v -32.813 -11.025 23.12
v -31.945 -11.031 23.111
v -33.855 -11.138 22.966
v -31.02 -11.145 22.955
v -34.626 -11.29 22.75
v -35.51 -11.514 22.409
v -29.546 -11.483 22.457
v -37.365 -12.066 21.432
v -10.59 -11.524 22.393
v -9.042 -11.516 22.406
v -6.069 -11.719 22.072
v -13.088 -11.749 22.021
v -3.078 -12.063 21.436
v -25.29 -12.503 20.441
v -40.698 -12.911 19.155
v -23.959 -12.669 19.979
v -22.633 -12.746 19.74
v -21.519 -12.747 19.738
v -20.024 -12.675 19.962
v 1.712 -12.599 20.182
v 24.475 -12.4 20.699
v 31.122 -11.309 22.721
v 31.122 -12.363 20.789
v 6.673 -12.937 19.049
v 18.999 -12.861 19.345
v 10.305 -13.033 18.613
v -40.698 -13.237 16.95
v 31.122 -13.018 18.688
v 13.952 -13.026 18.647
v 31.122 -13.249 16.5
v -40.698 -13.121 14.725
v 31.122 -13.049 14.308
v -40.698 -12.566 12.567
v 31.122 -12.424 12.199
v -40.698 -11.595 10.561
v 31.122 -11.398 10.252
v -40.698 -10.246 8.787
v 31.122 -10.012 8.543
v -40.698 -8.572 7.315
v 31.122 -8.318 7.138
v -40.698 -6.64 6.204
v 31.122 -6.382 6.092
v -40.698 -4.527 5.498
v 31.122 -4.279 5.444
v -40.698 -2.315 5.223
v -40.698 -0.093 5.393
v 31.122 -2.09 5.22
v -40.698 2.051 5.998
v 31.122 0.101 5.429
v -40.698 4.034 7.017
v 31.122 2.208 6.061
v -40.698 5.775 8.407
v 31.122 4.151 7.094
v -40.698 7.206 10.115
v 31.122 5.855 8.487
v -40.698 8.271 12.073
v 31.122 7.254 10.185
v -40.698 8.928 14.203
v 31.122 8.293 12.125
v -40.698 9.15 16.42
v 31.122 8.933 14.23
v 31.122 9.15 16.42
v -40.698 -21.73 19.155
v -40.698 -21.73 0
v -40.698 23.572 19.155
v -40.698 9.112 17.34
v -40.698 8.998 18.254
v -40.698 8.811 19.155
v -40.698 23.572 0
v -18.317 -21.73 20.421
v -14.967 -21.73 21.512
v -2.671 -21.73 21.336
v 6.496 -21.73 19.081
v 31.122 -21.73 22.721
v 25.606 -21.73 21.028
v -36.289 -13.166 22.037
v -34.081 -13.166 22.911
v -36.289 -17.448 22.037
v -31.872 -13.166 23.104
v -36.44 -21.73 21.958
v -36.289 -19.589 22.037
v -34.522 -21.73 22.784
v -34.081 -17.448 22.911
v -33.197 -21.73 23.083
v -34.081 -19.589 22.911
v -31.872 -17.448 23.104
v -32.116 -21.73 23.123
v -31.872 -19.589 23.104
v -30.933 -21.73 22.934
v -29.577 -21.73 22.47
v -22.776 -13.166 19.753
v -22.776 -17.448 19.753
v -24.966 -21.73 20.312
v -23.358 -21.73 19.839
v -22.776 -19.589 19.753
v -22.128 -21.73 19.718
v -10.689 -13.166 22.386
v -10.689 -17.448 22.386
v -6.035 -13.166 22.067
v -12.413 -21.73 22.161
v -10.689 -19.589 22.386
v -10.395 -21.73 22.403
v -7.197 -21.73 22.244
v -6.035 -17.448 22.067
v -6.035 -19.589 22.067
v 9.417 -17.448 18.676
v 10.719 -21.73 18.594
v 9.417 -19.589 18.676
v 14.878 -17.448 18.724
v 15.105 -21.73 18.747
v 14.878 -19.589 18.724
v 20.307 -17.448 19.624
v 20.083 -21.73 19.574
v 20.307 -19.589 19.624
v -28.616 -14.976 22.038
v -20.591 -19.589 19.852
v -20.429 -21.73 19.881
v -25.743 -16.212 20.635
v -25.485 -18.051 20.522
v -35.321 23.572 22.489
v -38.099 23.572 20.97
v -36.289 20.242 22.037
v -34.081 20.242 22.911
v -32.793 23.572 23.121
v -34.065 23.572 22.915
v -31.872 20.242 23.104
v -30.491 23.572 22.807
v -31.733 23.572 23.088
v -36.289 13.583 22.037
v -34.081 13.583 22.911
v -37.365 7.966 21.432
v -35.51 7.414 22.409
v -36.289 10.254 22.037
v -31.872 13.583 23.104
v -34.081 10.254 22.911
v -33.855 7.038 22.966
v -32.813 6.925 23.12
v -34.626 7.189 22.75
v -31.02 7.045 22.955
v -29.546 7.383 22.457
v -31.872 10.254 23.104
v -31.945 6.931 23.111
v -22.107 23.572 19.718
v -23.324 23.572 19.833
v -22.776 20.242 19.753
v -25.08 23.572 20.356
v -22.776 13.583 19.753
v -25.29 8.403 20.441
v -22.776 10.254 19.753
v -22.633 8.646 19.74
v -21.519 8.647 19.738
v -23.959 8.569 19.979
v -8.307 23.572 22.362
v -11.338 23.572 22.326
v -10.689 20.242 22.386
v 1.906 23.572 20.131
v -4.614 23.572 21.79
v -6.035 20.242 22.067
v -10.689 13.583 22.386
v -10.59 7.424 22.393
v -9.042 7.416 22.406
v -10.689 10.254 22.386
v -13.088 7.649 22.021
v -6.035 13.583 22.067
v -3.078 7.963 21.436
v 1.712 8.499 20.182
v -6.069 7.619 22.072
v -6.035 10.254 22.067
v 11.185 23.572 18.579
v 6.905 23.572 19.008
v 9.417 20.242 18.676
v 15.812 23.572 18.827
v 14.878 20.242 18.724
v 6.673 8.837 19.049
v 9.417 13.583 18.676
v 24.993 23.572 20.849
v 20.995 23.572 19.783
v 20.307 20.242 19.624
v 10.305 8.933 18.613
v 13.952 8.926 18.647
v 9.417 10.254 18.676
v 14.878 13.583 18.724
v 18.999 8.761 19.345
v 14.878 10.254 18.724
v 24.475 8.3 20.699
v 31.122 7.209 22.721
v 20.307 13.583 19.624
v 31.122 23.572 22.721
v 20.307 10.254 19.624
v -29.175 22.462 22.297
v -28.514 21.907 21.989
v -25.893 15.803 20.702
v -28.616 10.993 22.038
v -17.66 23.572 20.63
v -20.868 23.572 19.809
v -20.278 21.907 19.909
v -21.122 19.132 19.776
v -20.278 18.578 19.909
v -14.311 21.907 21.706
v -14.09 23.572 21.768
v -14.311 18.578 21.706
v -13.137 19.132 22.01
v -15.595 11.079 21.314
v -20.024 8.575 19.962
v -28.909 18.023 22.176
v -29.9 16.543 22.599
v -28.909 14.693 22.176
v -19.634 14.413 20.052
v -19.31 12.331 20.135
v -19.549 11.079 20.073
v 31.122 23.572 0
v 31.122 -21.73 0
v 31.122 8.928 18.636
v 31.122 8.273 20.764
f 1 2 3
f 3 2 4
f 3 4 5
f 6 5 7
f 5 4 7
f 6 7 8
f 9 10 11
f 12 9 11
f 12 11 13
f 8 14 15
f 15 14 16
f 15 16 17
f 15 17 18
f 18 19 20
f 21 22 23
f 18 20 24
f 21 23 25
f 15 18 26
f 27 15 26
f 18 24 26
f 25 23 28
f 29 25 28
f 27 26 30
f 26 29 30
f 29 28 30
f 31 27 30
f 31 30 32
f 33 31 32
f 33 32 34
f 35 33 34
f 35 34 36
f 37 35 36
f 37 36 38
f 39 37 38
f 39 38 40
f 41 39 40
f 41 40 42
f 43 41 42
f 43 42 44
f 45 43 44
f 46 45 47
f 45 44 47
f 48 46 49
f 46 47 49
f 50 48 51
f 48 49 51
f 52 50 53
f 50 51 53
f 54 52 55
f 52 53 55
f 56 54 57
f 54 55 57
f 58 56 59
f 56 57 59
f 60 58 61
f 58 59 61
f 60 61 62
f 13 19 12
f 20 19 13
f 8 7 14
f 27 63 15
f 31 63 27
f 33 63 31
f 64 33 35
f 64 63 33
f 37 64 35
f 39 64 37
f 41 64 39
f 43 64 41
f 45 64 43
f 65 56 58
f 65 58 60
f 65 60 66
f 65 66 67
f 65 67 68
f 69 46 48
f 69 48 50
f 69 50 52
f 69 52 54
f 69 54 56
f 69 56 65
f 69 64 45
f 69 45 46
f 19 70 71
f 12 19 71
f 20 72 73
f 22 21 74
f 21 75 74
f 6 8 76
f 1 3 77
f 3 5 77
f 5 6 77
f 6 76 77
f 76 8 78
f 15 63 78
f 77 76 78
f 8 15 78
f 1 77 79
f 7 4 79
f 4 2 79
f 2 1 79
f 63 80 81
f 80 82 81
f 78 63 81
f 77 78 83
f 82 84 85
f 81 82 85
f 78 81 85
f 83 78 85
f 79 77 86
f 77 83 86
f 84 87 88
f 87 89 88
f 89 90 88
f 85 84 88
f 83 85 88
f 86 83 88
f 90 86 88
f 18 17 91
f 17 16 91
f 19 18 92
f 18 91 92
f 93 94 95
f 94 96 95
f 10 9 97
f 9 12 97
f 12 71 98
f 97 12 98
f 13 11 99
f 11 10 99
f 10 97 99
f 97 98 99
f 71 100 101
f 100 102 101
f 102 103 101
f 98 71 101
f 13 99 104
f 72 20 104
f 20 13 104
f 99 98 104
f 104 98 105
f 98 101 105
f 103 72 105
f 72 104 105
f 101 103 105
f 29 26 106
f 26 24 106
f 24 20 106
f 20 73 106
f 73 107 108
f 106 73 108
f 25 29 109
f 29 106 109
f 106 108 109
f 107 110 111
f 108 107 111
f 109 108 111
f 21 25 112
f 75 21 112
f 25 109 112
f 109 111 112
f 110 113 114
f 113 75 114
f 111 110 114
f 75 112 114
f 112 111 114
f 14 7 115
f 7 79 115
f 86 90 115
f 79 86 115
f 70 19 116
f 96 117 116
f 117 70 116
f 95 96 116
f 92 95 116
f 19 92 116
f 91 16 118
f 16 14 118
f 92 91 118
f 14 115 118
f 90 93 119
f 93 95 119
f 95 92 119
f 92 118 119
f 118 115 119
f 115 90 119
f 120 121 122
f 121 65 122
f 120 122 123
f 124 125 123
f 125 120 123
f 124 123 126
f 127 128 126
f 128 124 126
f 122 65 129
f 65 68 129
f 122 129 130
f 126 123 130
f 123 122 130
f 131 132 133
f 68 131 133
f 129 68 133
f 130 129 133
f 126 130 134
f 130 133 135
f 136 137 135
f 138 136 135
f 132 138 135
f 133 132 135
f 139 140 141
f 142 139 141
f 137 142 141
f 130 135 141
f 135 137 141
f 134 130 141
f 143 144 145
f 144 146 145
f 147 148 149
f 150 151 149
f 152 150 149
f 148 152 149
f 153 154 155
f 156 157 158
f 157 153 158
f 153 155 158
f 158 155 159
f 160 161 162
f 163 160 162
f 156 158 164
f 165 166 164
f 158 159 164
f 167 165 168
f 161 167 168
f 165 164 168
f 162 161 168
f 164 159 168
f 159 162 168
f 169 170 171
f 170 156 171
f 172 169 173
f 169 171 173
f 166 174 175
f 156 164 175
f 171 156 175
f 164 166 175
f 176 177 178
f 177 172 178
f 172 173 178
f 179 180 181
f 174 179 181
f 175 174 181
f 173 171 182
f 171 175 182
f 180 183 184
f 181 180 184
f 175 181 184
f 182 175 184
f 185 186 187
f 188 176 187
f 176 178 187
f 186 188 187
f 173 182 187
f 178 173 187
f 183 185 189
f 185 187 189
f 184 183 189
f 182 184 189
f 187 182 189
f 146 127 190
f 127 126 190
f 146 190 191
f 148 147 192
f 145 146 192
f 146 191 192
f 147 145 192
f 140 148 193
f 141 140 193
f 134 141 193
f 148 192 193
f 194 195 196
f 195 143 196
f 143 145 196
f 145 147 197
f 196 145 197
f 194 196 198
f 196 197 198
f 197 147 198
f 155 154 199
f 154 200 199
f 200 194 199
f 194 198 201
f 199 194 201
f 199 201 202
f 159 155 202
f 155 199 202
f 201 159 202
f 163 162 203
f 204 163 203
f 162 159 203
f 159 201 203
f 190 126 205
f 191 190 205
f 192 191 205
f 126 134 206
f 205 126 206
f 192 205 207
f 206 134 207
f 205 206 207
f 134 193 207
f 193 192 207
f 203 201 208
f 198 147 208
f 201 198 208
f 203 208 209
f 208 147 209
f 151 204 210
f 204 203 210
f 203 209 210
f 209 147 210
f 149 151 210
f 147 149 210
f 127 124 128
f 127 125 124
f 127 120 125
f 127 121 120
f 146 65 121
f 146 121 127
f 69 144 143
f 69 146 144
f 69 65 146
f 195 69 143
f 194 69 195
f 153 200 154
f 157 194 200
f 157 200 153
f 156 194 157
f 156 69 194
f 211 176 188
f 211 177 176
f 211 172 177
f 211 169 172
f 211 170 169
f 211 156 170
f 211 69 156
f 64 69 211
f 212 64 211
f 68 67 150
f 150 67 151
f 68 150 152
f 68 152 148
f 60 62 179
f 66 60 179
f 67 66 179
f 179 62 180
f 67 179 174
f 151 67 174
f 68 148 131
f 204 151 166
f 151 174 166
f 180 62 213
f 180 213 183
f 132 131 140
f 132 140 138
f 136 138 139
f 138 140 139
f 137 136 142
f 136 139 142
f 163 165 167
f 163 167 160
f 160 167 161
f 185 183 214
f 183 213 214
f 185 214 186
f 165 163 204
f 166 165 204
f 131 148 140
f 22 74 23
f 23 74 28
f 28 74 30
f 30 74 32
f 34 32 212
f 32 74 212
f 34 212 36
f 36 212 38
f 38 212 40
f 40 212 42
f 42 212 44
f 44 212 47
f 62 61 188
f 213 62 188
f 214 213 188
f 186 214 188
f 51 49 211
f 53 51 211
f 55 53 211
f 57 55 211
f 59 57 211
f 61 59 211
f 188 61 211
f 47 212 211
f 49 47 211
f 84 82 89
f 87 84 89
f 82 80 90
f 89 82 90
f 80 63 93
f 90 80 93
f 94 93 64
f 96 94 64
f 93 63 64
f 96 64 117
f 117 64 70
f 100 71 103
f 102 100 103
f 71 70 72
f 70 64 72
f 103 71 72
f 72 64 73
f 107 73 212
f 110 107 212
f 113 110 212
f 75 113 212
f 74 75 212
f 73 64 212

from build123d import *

# Parameters (mm, degrees)
F0_W     = 71.8196127564
F0_H     = 45.3016031533
F1_DEPTH = 25
F3_DEPTH = 71.8206127564
F5_DEPTH = 45.3026031533


with BuildPart() as f1:
    # F0 (on Top) → F1 (new body)
    with BuildSketch(Plane.XY):
        with Locations((-4.787969403, 0.9207585827)):
            Rectangle(F0_W, F0_H)
    extrude(amount=F1_DEPTH)

    # F2 (on face) → F3 (cut, through all)
    with BuildSketch(Plane.YZ.offset(31.1218369752)):
        with BuildLine():
            ThreePointArc((-9.2483829324, 25), (-6.7836719894, 6.2698377231), (9.1495755455, 16.419980675))
            ThreePointArc((9.1495755455, 16.419980675), (8.1000626152, 21.1535723277), (5.1482222591, 25))
            Line((5.1482222591, 25), (-9.2483829324, 25))
        make_face()
    extrude(amount=-F3_DEPTH, mode=Mode.SUBTRACT)

    # F4 (on face) → F5 (cut, through all)
    with BuildSketch(Plane.XZ.offset(21.730042994)):
        with BuildLine():
            Line((-40.6977757812, 25), (-40.6977757812, 19.1547963768))
            add(Edge.make_bspline(
                [(-40.6977757812, 19.1547963768), (-37.7597455886, 21.2769441588), (-31.8768521894, 25.5279400785), (-22.6143195247, 17.0043045257), (-10.3150227377, 25.519319585), (9.8065595969, 15.6580017037), (23.9148476866, 20.4993176259), (31.1218369752, 22.7205809206)],
                knots=[0, 0, 0, 0, 0.1640011889, 0.3282036418, 0.5137050928, 0.7521804987, 1, 1, 1, 1], degree=3))
            Line((31.1218369752, 22.7205809206), (31.1218369752, 25))
            Line((31.1218369752, 25), (-40.6977757812, 25))
        make_face()
    extrude(amount=-F5_DEPTH, mode=Mode.SUBTRACT)


solid = f1.part
